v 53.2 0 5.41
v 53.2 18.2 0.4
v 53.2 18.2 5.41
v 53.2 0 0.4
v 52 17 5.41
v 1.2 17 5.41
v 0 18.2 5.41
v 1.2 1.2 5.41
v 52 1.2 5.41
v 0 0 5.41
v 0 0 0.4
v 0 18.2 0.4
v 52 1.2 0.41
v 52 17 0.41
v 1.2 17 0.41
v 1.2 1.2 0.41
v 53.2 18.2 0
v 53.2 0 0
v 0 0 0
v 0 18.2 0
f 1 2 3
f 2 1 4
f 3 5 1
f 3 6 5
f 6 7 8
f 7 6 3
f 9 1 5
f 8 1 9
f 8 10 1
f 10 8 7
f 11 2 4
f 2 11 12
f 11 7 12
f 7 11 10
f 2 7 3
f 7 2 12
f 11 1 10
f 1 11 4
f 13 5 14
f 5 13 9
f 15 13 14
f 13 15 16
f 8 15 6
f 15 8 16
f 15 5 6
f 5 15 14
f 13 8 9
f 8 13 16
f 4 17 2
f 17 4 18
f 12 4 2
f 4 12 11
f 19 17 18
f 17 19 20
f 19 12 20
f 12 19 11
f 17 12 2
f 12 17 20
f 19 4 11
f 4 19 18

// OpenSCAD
// file: ../../Base/Boxes.scad
// Fischertechnik Box Foundation
// Pre-designed Boxes

use <Constants.scad>

include <PlacementOptions.scad>

box190Width = 190;
box190Depth = 130;
box130Width = 130;
box130Depth = 95;
boxUsageHeight = 33.9;
boxWallThickness = 2.4;
boxBaseThickness = 1.0;
boxWebWidth = 3.0;

// getBoxWallThickness()
// Gets the wall thickness of a Fischertechnik Box

function getBoxWallThickness() = boxWallThickness;

// Gets the usable height of a fischertechnik box
function getBoxUsageHeight() = boxUsageHeight;

// Gets the thickness of the Fischertechnik box base.
function getBoxBaseThickness() = boxBaseThickness;

// Gets the width of a box web
function getBoxWebWidth() = boxWebWidth;

// Gets the usable inner space of a Box 190 as an x/y-list
function getBox190Space() = [
    box190Width - 2*getBoxWallThickness(), 
    box190Depth - 2*getBoxWallThickness() ];

// Imports the Fischertechnik empty box 130x190 mm and places it at position 0,0
// 190x130 are the outer sizes, the inner space is slightly smaller. Use getBox190Space() to get the inner sizes.
// This module needs the STL file "Fischertechnik Box 130x190.stl" in the library path.
// The box is positioned that the usable inner space is at the 0,0,0 position. The

module Box190() {
    translate([-getBoxWallThickness(),-getBoxWallThickness(),-getBoxBaseThickness()])
        import("Fischertechnik Box 130x190.stl", convexity=3);
}

// Gets the usable inner space of a Box 130 as an x/y-list
function getBox130Space() = [
    box130Width - 2*getBoxWallThickness(), 
    box130Depth - 2*getBoxWallThickness() ];

// Imports the Fischertechnik empty box 95x130 mm and places it at position 0,0
// 190x130 are the outer sizes, the inner space is slightly smaller. Use getBox190Space() to get the inner sizes.
// This module needs the STL file "Fischertechnik Box 95x130.stl" in the library path.
// The box is positioned that the usable inner space is at the 0,0,0 position. The

module Box130() {
    translate([-getBoxWallThickness(),-getBoxWallThickness(),-getBoxBaseThickness()])
        import("Fischertechnik Box 95x130.stl", convexity=3);
}

// Creates a web at the specified box walls
// corner 0 = LowerLeft, 1 = UpperLeft, 2 = UpperRight, 3 = LowerRight
// side 0 = LeftOfCorner, 1 = RightOfCorner
// distance = Distance in mm from the corner
// box = inner width and depth of the box (default: Box 190)
// webWidth = length of the web (default is 3 mms)
// webThickness = thickness of the web (default is 1 mm)

module BoxWeb(corner, side, distance, box=getBox190Space(), webWidth=getBoxWebWidth(), webThickness=1.0) {
    sink = getBoxWallThickness()/2;

    width = (corner % 2 == 0) ? 
            (side == LeftOfCorner ? webWidth : webThickness) :
            (side == LeftOfCorner ? webThickness : webWidth);

    depth = (corner % 2 == 0) ? 
            (side == RightOfCorner ? webWidth : webThickness) :
            (side == RightOfCorner ? webThickness : webWidth);
    
    xDiff = corner == LowerLeft ? 
                (side == LeftOfCorner ? -sink : distance) :
            (corner == UpperLeft ?                
                (side == LeftOfCorner ? distance : -sink) :
            (corner == UpperRight ?
                (side == LeftOfCorner ? box.x-webWidth+sink : box.x-distance-webThickness) :
                (side == LeftOfCorner ? box.x-distance-webThickness: box.x-webWidth+sink)));

    yDiff = corner == LowerLeft ? 
                (side == RightOfCorner ? -sink : distance) :
            (corner == UpperLeft ?
                (side == RightOfCorner ? box.y-distance : box.y-webWidth+sink) :
            (corner == UpperRight ?
                (side == RightOfCorner ? box.y-webWidth+sink : box.y-distance) :
                (side == RightOfCorner ? distance : -sink)));
    
    translate([xDiff, yDiff, -getExcess()])
        cube([width, depth, boxUsageHeight + 2*getExcess()]);
}
// file: ../../Base/Rotation.scad
// Fischertechnik Box Foundation
// Geometry Helpers Rotation

include <PlacementOptions.scad>

// getRotatedSpace(space, rotation=NoRotation)
// Rotates the space dependent on the specified rotation

function getRotatedSpace(space, rotation=NoRotation) = [
    (rotation == Rotate90 || rotation == Rotate270) ? space.y : space.x,
    (rotation == Rotate90 || rotation == Rotate270) ? space.x : space.y
];

// Rotates the given space around the fixed left lower corner
// space = the space the children needs as width/depth list [width,depth]
// rotation = 0 Rotate0 degrees, 1 Rotate90 degrees, 2 Rotate180 degrees, 3 Rotate270 degrees (equivalent to -90)

module RotateFix(space, rotation=Rotate0) {
    dy = (rotation == Rotate0 || rotation == Rotate270) ? 0 :
        (rotation == Rotate90) ? space.x :
        space.y;
    dx = (rotation < Rotate180) ? 0 :
        (rotation == Rotate180) ? space.x :
        space.y;
    
    translate([dx, dy, 0])
        rotate([0, 0, rotations[rotation]])
            children();
}
// file: ../../Base/Alignment.scad
// Fischertechnik Box Foundation
// Geometry Helpers Alignment

include <PlacementOptions.scad>

// getAlignedX(elementWidth, spaceWidth, align=AlignRight, offset=0)
// Gets the aligned X offset of an element with the given
// width in the given space.
// elementWidth = The width of the element to positon
// spaceWidth = The space where the element should be aligned
// align = 0 AlignLeft, 1 AlignCenter, 2 AlignRight
// offset = an optional offset from the aligned position. When
// aligned left or centered, then positive values are in X direction.
// When aligned right then positive values are in negative X direction.

function getAlignedX(elementWidth, spaceWidth, align=AlignRight, offset=0) =
    (align == AlignLeft) ?
        offset :
        ((align == AlignCenter) ?
        (spaceWidth - elementWidth)/2 + offset :
        spaceWidth - offset - elementWidth);

// getAlignedY(elementDepth, spaceDepth, align=AlignTop, offset=0)
// Gets the aligned Y offset of an element with the given
// depth in the given space.
// elementDepth = The depth of the element to positon
// spaceDepth = The space where the element should be aligned
// align = 0 AlignBottom, 1 AlignCenter, 2 AlignTop
// offset = an optional offset from the aligned position. When
// aligned bottom or centered, then positive values are in Y direction.
// When aligned top then positive values are in negative Y direction.

function getAlignedY(elementDepth, spaceDepth, align=AlignTop, offset=0) =
    (align == AlignBottom) ?
        offset :
        ((align == AlignCenter) ?
        (spaceDepth - elementDepth)/2 + offset :
        spaceDepth - offset - elementDepth);
// file: ../../Base/PlacementOptions.scad
// Fischertechnik Box Foundation
// Placement Options

// Alignment
NoAlign = 0;
AlignLeft = 1;
AlignBottom = 2;
AlignCenter = 3;
AlignRight = 4;
AlignTop = 5;

// Element rotation degree steps
rotations = [0, -90, -180, -270];

// Rotation
NoRotation = 0;
Rotate0 = 0;
Rotate90 = 1;
Rotate180 = 2;
Rotate270 = 3;

// Docking (seen from above)
NoDock = -1;
DockLeft = 0;
DockTop = 1;
DockRight = 2;
DockCorner = 2;
DockBottom = 3;

// Web corners
LowerLeft = 0;
UpperLeft = 1;
UpperRight = 2;
LowerRight = 3;

// Web position relative to corner
LeftOfCorner = 0;
RightOfCorner = 1;
// file: ../../Base/Placement.scad
// Fischertechnik Box Foundation
// Geometry Helpers Placement

use <Constants.scad>
use <Alignment.scad>
use <Rotation.scad>
use <Boxes.scad>

include <PlacementOptions.scad>

// Place(x=0, y=0, elementSpace=[0,0], alignX=AlignLeft, alignY=AlignBottom, rotation=Rotate0, boxSpace=getBox190Space())
// Places the child at the specified position
// y = Y-Position. This is a relative position when an X aligment is specified.
// x = X-Position. This is a relative position when an Y aligment is specified.
// elementSpace = space of the element to be placed [x,y]
// alignX = -1=NoAlign, 0 AlignLeft, 1 AlignCenter, 3 AlignRight (elementSpace and boxSpace required!)
// alignY = -1=NoAlign, 2 AlignBottom, 1 AlignCenter, 4 AlignTop (elementSpace and boxSpace required!)
// rotation = 0 Rotate0 0 degrees, 1 Rotate90 90 degrees, 
// 2 Rotate180 180 degrees, 3 Rotate270 270 degrees (equivalent to -90)
// boxSpace = Inner space of the box where the placement occurs [x,y] - default is Box 190x130 inner space

module Place(x=0, y=0, elementSpace=[0,0], 
  alignX=AlignLeft, alignY=AlignBottom, 
  rotation=NoRotation, boxSpace=getBox190Space()) {

    module Position(x, y, space, rotation=Rotate0) {
        translate([x, y, 0])
            RotateFix(space, rotation)
                children();
    }

    space = getRotatedSpace(elementSpace, rotation);
    alignedX = getAlignedX(space.x, boxSpace.x, alignX, x);
    alignedY = getAlignedY(space.y, boxSpace.y, alignY, y);
    Position(alignedX, alignedY, elementSpace, rotation)
        children();
}

// Center(space=getBox130Space(), elementSpace=[0,0])
// space = Space where the children is centered. For cylinder use centered=true and no elementSpace.
// elementSpace = space of the element to be centered [x,y]

module Center(space=getBox190Space(), elementSpace=[0,0]) {
    translate([(space.x - elementSpace.x) / 2, (space.y - elementSpace.y) / 2])
        children(0);
}

// CenterHorizontal(width=0, y=0, offset=0, space=getBox130Space())
// space = Space where the children is centered. For cylinder use centered=true and no elementSpace.
// elementSpace = space of the element to be centered [x,y]

module CenterHorizontal(width=0, y=0, offset=0, space=getBox190Space()) {
    translate([(space.x - width) / 2 + offset, y])
        children(0);
}

// CenterVertical(depth=0, x=0, offset=0, space=getBox130Space())
// space = Space where the children is centered. For cylinder use centered=true and no elementSpace.
// elementSpace = space of the element to be centered [x,y]

module CenterVertical(depth=0, x=0, offset=0, space=getBox190Space()) {
    translate([x, (space.y - depth) / 2 + offset])
        children(0);
}
// file: ../../Elements/AxisClip10.scad
// Fischertechnik Box Library
// Axis for clip 10
// 31023

use <../ModelBase/Simple.scad>

width = 12;
depth = 12;
height = 23;

// getAxisClip10Space()
// Gets the space of a frame for a clip 10 with spring ring (mot2)

function getAxisClip10Space() = [width, depth, height];

// AxisClip10()
// Axis for clip 10 with spring ring (mot2)

module AxisClip10() {
    LeveledAxisWithSpace(height, height-10, getAxisClip10Space());
}

// Tests
color("lightgray")
AxisClip10();
// file: ../../Base/Constants.scad
// Fischertechnik Box Foundation
// Constants

// Constant values necessary for multiple elements

// Base constants
dividerThickness = 1.2;
excess = 0.01;
fragments = 90;
tolerance = 0.8;

// Gets the thickness of a divider 
function getDividerThickness() = dividerThickness;

// Gets the excess that is used to merge walls into each other
function getExcess() = excess;

// Gets amount of fragments of a cylinder
function getFragments() = fragments;

// Gets the inner tolerance of a frame to each side
function getTolerance() = tolerance;


// Fischertechnik specific constants
axisDiameter = 4;
axisBottomDiameter = axisDiameter + 1;
standardEdgeDistance = 2.5;
standardWebDistance = 11.5;
standardCornerLength = 15;
tubeWallFactor = 0.8;

// Gets axis diameter
function getAxisDiameter() = axisDiameter;

// Gets axis bottom diameter for thicker part at the bottom
function getAxisBottomDiameter() = axisBottomDiameter;

// gets the standard distance to the wall of the box for dockable frames with webs
function getStandardEdgeDistance() = standardEdgeDistance;

// gets the standard distance of each web to the corner of the dockable frame
function getStandardWebDistance() = standardWebDistance;

// gets the standard length of the corner walls of a dockable frame
function getStandardCornerLength() = standardCornerLength;

// gets the wall thickness of a tube.
function getTubeWallThickness() = tubeWallFactor * getDividerThickness();
// file: ../../Elements/FrameHingedBlock.scad
// Fischertechnik Box Library
// Frame for Hinged Block
// 31008

use <../Base/Constants.scad>
use <../ModelBase/Simple.scad>

width = 50;
depth = 15;
height = 5;

// getFrameHingedBlockSpace()
// Gets the space for the hinged block frame.

function getFrameHingedBlockSpace() = getFrameOuterVolume([width, depth, height]);

// FrameHingedBlock()
// Frame for hinged block (strait)
// 31008

module FrameHingedBlock() {
    Frame([width, depth, height]);
}

// Test
color("lightgray")
FrameHingedBlock();
// file: ../TestPrint.scad
// 3D Print Test Base

use <../Base/Constants.scad>

use <../Elements/AxisClip10.scad>

module TestPrint(elementSpace) {
    cube([elementSpace.x, elementSpace.y, 0.4]);
    translate([0,0,0.4+getExcess()]) {
        children();
    }
}

TestPrint(getAxisClip10Space())
    AxisClip10();
// main file
// 3D Print Test Base
// FrameHingedBlock

use <../TestPrint.scad>
use <../../Elements/FrameHingedBlock.scad>

TestPrint(getFrameHingedBlockSpace())
    FrameHingedBlock();
